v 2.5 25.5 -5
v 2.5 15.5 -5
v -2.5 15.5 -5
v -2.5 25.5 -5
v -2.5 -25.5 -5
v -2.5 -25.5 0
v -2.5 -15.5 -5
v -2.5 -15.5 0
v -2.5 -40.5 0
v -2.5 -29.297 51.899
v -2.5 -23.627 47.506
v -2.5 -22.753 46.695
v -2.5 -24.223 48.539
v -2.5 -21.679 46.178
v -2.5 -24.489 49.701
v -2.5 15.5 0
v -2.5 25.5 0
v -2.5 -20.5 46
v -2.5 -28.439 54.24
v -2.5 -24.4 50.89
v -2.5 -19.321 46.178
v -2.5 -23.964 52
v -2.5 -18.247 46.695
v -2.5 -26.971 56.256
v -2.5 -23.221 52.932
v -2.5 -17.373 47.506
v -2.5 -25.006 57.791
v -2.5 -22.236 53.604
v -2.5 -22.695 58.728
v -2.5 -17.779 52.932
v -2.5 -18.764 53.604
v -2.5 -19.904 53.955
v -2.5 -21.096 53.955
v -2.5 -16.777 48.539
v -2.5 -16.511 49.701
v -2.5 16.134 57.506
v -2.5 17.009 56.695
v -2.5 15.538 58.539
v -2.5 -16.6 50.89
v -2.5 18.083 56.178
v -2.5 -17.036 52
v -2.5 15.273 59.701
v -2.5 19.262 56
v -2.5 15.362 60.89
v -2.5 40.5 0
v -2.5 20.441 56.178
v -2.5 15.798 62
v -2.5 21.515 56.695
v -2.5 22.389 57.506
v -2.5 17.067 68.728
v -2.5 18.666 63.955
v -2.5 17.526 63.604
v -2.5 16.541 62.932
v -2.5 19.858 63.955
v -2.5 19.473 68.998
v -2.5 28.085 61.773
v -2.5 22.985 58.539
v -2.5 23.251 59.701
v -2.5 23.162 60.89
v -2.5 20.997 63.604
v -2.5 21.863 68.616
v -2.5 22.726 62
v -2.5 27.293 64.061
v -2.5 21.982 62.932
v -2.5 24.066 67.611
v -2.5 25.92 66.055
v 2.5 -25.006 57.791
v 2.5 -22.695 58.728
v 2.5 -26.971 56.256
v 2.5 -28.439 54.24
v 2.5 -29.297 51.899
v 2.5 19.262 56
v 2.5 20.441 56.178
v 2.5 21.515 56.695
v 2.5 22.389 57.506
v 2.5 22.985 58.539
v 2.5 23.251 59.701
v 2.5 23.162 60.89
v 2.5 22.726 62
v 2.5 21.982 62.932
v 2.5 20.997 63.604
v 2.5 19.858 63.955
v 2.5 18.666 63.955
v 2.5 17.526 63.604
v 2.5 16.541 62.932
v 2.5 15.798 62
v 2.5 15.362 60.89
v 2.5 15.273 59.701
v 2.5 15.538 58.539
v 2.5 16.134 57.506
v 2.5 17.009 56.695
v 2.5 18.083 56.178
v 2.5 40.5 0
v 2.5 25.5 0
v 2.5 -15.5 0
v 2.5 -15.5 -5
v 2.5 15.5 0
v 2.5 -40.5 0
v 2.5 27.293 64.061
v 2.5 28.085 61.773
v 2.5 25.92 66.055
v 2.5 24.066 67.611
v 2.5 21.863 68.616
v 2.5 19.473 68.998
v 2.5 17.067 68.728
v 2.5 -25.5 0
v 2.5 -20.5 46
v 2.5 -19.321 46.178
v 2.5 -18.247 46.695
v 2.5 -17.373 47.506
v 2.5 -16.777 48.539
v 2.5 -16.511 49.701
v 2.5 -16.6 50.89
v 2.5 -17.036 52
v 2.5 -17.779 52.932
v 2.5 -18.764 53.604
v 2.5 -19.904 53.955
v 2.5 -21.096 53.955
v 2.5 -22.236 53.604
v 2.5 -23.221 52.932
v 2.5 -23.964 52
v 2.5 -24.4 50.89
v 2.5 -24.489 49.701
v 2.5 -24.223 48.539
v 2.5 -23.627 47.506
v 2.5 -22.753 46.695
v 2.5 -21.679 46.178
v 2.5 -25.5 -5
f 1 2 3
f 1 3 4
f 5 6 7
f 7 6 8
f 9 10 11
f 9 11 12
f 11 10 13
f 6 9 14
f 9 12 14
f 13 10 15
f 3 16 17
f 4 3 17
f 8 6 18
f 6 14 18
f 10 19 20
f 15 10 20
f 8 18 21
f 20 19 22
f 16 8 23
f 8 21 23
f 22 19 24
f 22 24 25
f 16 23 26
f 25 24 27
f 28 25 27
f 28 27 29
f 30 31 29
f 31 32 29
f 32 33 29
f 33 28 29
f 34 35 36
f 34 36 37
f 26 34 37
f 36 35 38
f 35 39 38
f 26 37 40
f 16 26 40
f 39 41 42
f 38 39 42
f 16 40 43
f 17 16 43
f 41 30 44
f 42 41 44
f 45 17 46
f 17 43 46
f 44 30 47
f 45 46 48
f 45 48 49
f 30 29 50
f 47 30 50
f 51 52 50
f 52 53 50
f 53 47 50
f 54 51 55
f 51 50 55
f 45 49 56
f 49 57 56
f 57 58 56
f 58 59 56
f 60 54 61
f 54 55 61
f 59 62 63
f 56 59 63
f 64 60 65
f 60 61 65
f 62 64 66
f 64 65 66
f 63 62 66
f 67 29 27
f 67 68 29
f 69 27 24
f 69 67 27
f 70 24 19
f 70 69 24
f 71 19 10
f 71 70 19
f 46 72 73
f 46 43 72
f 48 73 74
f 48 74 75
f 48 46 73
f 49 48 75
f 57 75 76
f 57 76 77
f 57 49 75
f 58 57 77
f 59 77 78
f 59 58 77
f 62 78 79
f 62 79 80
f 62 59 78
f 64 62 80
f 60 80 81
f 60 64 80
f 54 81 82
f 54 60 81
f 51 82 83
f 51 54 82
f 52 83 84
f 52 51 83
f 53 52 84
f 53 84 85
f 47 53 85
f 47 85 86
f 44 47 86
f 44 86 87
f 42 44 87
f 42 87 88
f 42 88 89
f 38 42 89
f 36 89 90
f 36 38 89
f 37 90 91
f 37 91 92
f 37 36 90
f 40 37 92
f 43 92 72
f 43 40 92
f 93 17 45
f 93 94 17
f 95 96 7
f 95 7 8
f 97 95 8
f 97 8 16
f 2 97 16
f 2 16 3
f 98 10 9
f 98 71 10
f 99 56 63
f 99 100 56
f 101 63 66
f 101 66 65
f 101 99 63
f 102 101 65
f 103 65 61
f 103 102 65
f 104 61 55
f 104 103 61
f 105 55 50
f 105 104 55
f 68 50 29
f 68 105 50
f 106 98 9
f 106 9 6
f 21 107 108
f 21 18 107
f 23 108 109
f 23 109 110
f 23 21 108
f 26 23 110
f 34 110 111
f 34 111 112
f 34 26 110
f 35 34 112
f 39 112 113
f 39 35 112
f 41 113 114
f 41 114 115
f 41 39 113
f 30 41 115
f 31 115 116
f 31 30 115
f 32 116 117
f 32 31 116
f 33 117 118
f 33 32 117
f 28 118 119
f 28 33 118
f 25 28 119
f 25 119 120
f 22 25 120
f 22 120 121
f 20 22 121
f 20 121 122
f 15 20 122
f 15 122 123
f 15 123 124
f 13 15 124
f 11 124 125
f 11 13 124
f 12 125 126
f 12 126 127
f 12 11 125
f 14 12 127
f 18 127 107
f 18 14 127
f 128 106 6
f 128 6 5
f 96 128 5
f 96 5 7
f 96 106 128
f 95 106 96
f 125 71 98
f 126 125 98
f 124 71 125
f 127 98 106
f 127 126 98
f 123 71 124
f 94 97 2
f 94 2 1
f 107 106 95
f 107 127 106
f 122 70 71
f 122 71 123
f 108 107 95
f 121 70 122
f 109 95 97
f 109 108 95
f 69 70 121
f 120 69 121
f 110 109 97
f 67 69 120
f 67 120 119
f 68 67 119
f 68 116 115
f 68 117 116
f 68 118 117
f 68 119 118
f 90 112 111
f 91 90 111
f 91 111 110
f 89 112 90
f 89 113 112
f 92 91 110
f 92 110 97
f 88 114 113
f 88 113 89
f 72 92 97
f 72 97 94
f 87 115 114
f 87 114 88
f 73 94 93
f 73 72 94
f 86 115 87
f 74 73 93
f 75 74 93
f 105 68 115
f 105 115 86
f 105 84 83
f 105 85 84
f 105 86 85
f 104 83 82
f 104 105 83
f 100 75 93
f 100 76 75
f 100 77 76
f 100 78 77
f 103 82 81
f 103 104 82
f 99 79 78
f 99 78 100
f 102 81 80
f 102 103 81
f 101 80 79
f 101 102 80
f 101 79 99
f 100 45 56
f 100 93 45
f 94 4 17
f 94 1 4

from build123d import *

# Parameters (mm, degrees)
SKETCH1_R           = 4
BOSS_EXTRUDE1_DEPTH = 2.5


with BuildPart() as part:
    # Sketch1 → Boss-Extrude1 (new, symmetric)
    with BuildSketch(Plane.YZ):
        with BuildLine():
            Line((-29.297384522, 51.898953809), (-40.5, 0))
            Line((-40.5, 0), (-25.5, 0))
            Line((-25.5, 0), (-25.5, -5))
            Line((-25.5, -5), (-15.5, -5))
            Line((-15.5, -5), (-15.5, 0))
            Line((-15.5, 0), (15.5, 0))
            Line((15.5, 0), (15.5, -5))
            Line((15.5, -5), (25.5, -5))
            Line((25.5, -5), (25.5, 0))
            Line((25.5, 0), (40.5, 0))
            Line((40.5, 0), (28.085365409, 61.773282105))
            ThreePointArc((28.085365409, 61.773282105), (24.06562356, 67.610728604), (17.066668753, 68.728197959))
            Line((17.066668753, 68.728197959), (-22.695121951, 58.728197959))
            ThreePointArc((-22.695121951, 58.728197959), (-26.970582938, 56.255522076), (-29.297384522, 51.898953809))
        make_face()
        with Locations(Location((-20.5, 50, 0), (0, 0, 270))):
            Circle(SKETCH1_R, mode=Mode.SUBTRACT)
        with Locations(Location((19.261790704, 60, 0), (0, 0, 270))):
            Circle(SKETCH1_R, mode=Mode.SUBTRACT)
    extrude(amount=BOSS_EXTRUDE1_DEPTH, both=True)


solid = part.part
